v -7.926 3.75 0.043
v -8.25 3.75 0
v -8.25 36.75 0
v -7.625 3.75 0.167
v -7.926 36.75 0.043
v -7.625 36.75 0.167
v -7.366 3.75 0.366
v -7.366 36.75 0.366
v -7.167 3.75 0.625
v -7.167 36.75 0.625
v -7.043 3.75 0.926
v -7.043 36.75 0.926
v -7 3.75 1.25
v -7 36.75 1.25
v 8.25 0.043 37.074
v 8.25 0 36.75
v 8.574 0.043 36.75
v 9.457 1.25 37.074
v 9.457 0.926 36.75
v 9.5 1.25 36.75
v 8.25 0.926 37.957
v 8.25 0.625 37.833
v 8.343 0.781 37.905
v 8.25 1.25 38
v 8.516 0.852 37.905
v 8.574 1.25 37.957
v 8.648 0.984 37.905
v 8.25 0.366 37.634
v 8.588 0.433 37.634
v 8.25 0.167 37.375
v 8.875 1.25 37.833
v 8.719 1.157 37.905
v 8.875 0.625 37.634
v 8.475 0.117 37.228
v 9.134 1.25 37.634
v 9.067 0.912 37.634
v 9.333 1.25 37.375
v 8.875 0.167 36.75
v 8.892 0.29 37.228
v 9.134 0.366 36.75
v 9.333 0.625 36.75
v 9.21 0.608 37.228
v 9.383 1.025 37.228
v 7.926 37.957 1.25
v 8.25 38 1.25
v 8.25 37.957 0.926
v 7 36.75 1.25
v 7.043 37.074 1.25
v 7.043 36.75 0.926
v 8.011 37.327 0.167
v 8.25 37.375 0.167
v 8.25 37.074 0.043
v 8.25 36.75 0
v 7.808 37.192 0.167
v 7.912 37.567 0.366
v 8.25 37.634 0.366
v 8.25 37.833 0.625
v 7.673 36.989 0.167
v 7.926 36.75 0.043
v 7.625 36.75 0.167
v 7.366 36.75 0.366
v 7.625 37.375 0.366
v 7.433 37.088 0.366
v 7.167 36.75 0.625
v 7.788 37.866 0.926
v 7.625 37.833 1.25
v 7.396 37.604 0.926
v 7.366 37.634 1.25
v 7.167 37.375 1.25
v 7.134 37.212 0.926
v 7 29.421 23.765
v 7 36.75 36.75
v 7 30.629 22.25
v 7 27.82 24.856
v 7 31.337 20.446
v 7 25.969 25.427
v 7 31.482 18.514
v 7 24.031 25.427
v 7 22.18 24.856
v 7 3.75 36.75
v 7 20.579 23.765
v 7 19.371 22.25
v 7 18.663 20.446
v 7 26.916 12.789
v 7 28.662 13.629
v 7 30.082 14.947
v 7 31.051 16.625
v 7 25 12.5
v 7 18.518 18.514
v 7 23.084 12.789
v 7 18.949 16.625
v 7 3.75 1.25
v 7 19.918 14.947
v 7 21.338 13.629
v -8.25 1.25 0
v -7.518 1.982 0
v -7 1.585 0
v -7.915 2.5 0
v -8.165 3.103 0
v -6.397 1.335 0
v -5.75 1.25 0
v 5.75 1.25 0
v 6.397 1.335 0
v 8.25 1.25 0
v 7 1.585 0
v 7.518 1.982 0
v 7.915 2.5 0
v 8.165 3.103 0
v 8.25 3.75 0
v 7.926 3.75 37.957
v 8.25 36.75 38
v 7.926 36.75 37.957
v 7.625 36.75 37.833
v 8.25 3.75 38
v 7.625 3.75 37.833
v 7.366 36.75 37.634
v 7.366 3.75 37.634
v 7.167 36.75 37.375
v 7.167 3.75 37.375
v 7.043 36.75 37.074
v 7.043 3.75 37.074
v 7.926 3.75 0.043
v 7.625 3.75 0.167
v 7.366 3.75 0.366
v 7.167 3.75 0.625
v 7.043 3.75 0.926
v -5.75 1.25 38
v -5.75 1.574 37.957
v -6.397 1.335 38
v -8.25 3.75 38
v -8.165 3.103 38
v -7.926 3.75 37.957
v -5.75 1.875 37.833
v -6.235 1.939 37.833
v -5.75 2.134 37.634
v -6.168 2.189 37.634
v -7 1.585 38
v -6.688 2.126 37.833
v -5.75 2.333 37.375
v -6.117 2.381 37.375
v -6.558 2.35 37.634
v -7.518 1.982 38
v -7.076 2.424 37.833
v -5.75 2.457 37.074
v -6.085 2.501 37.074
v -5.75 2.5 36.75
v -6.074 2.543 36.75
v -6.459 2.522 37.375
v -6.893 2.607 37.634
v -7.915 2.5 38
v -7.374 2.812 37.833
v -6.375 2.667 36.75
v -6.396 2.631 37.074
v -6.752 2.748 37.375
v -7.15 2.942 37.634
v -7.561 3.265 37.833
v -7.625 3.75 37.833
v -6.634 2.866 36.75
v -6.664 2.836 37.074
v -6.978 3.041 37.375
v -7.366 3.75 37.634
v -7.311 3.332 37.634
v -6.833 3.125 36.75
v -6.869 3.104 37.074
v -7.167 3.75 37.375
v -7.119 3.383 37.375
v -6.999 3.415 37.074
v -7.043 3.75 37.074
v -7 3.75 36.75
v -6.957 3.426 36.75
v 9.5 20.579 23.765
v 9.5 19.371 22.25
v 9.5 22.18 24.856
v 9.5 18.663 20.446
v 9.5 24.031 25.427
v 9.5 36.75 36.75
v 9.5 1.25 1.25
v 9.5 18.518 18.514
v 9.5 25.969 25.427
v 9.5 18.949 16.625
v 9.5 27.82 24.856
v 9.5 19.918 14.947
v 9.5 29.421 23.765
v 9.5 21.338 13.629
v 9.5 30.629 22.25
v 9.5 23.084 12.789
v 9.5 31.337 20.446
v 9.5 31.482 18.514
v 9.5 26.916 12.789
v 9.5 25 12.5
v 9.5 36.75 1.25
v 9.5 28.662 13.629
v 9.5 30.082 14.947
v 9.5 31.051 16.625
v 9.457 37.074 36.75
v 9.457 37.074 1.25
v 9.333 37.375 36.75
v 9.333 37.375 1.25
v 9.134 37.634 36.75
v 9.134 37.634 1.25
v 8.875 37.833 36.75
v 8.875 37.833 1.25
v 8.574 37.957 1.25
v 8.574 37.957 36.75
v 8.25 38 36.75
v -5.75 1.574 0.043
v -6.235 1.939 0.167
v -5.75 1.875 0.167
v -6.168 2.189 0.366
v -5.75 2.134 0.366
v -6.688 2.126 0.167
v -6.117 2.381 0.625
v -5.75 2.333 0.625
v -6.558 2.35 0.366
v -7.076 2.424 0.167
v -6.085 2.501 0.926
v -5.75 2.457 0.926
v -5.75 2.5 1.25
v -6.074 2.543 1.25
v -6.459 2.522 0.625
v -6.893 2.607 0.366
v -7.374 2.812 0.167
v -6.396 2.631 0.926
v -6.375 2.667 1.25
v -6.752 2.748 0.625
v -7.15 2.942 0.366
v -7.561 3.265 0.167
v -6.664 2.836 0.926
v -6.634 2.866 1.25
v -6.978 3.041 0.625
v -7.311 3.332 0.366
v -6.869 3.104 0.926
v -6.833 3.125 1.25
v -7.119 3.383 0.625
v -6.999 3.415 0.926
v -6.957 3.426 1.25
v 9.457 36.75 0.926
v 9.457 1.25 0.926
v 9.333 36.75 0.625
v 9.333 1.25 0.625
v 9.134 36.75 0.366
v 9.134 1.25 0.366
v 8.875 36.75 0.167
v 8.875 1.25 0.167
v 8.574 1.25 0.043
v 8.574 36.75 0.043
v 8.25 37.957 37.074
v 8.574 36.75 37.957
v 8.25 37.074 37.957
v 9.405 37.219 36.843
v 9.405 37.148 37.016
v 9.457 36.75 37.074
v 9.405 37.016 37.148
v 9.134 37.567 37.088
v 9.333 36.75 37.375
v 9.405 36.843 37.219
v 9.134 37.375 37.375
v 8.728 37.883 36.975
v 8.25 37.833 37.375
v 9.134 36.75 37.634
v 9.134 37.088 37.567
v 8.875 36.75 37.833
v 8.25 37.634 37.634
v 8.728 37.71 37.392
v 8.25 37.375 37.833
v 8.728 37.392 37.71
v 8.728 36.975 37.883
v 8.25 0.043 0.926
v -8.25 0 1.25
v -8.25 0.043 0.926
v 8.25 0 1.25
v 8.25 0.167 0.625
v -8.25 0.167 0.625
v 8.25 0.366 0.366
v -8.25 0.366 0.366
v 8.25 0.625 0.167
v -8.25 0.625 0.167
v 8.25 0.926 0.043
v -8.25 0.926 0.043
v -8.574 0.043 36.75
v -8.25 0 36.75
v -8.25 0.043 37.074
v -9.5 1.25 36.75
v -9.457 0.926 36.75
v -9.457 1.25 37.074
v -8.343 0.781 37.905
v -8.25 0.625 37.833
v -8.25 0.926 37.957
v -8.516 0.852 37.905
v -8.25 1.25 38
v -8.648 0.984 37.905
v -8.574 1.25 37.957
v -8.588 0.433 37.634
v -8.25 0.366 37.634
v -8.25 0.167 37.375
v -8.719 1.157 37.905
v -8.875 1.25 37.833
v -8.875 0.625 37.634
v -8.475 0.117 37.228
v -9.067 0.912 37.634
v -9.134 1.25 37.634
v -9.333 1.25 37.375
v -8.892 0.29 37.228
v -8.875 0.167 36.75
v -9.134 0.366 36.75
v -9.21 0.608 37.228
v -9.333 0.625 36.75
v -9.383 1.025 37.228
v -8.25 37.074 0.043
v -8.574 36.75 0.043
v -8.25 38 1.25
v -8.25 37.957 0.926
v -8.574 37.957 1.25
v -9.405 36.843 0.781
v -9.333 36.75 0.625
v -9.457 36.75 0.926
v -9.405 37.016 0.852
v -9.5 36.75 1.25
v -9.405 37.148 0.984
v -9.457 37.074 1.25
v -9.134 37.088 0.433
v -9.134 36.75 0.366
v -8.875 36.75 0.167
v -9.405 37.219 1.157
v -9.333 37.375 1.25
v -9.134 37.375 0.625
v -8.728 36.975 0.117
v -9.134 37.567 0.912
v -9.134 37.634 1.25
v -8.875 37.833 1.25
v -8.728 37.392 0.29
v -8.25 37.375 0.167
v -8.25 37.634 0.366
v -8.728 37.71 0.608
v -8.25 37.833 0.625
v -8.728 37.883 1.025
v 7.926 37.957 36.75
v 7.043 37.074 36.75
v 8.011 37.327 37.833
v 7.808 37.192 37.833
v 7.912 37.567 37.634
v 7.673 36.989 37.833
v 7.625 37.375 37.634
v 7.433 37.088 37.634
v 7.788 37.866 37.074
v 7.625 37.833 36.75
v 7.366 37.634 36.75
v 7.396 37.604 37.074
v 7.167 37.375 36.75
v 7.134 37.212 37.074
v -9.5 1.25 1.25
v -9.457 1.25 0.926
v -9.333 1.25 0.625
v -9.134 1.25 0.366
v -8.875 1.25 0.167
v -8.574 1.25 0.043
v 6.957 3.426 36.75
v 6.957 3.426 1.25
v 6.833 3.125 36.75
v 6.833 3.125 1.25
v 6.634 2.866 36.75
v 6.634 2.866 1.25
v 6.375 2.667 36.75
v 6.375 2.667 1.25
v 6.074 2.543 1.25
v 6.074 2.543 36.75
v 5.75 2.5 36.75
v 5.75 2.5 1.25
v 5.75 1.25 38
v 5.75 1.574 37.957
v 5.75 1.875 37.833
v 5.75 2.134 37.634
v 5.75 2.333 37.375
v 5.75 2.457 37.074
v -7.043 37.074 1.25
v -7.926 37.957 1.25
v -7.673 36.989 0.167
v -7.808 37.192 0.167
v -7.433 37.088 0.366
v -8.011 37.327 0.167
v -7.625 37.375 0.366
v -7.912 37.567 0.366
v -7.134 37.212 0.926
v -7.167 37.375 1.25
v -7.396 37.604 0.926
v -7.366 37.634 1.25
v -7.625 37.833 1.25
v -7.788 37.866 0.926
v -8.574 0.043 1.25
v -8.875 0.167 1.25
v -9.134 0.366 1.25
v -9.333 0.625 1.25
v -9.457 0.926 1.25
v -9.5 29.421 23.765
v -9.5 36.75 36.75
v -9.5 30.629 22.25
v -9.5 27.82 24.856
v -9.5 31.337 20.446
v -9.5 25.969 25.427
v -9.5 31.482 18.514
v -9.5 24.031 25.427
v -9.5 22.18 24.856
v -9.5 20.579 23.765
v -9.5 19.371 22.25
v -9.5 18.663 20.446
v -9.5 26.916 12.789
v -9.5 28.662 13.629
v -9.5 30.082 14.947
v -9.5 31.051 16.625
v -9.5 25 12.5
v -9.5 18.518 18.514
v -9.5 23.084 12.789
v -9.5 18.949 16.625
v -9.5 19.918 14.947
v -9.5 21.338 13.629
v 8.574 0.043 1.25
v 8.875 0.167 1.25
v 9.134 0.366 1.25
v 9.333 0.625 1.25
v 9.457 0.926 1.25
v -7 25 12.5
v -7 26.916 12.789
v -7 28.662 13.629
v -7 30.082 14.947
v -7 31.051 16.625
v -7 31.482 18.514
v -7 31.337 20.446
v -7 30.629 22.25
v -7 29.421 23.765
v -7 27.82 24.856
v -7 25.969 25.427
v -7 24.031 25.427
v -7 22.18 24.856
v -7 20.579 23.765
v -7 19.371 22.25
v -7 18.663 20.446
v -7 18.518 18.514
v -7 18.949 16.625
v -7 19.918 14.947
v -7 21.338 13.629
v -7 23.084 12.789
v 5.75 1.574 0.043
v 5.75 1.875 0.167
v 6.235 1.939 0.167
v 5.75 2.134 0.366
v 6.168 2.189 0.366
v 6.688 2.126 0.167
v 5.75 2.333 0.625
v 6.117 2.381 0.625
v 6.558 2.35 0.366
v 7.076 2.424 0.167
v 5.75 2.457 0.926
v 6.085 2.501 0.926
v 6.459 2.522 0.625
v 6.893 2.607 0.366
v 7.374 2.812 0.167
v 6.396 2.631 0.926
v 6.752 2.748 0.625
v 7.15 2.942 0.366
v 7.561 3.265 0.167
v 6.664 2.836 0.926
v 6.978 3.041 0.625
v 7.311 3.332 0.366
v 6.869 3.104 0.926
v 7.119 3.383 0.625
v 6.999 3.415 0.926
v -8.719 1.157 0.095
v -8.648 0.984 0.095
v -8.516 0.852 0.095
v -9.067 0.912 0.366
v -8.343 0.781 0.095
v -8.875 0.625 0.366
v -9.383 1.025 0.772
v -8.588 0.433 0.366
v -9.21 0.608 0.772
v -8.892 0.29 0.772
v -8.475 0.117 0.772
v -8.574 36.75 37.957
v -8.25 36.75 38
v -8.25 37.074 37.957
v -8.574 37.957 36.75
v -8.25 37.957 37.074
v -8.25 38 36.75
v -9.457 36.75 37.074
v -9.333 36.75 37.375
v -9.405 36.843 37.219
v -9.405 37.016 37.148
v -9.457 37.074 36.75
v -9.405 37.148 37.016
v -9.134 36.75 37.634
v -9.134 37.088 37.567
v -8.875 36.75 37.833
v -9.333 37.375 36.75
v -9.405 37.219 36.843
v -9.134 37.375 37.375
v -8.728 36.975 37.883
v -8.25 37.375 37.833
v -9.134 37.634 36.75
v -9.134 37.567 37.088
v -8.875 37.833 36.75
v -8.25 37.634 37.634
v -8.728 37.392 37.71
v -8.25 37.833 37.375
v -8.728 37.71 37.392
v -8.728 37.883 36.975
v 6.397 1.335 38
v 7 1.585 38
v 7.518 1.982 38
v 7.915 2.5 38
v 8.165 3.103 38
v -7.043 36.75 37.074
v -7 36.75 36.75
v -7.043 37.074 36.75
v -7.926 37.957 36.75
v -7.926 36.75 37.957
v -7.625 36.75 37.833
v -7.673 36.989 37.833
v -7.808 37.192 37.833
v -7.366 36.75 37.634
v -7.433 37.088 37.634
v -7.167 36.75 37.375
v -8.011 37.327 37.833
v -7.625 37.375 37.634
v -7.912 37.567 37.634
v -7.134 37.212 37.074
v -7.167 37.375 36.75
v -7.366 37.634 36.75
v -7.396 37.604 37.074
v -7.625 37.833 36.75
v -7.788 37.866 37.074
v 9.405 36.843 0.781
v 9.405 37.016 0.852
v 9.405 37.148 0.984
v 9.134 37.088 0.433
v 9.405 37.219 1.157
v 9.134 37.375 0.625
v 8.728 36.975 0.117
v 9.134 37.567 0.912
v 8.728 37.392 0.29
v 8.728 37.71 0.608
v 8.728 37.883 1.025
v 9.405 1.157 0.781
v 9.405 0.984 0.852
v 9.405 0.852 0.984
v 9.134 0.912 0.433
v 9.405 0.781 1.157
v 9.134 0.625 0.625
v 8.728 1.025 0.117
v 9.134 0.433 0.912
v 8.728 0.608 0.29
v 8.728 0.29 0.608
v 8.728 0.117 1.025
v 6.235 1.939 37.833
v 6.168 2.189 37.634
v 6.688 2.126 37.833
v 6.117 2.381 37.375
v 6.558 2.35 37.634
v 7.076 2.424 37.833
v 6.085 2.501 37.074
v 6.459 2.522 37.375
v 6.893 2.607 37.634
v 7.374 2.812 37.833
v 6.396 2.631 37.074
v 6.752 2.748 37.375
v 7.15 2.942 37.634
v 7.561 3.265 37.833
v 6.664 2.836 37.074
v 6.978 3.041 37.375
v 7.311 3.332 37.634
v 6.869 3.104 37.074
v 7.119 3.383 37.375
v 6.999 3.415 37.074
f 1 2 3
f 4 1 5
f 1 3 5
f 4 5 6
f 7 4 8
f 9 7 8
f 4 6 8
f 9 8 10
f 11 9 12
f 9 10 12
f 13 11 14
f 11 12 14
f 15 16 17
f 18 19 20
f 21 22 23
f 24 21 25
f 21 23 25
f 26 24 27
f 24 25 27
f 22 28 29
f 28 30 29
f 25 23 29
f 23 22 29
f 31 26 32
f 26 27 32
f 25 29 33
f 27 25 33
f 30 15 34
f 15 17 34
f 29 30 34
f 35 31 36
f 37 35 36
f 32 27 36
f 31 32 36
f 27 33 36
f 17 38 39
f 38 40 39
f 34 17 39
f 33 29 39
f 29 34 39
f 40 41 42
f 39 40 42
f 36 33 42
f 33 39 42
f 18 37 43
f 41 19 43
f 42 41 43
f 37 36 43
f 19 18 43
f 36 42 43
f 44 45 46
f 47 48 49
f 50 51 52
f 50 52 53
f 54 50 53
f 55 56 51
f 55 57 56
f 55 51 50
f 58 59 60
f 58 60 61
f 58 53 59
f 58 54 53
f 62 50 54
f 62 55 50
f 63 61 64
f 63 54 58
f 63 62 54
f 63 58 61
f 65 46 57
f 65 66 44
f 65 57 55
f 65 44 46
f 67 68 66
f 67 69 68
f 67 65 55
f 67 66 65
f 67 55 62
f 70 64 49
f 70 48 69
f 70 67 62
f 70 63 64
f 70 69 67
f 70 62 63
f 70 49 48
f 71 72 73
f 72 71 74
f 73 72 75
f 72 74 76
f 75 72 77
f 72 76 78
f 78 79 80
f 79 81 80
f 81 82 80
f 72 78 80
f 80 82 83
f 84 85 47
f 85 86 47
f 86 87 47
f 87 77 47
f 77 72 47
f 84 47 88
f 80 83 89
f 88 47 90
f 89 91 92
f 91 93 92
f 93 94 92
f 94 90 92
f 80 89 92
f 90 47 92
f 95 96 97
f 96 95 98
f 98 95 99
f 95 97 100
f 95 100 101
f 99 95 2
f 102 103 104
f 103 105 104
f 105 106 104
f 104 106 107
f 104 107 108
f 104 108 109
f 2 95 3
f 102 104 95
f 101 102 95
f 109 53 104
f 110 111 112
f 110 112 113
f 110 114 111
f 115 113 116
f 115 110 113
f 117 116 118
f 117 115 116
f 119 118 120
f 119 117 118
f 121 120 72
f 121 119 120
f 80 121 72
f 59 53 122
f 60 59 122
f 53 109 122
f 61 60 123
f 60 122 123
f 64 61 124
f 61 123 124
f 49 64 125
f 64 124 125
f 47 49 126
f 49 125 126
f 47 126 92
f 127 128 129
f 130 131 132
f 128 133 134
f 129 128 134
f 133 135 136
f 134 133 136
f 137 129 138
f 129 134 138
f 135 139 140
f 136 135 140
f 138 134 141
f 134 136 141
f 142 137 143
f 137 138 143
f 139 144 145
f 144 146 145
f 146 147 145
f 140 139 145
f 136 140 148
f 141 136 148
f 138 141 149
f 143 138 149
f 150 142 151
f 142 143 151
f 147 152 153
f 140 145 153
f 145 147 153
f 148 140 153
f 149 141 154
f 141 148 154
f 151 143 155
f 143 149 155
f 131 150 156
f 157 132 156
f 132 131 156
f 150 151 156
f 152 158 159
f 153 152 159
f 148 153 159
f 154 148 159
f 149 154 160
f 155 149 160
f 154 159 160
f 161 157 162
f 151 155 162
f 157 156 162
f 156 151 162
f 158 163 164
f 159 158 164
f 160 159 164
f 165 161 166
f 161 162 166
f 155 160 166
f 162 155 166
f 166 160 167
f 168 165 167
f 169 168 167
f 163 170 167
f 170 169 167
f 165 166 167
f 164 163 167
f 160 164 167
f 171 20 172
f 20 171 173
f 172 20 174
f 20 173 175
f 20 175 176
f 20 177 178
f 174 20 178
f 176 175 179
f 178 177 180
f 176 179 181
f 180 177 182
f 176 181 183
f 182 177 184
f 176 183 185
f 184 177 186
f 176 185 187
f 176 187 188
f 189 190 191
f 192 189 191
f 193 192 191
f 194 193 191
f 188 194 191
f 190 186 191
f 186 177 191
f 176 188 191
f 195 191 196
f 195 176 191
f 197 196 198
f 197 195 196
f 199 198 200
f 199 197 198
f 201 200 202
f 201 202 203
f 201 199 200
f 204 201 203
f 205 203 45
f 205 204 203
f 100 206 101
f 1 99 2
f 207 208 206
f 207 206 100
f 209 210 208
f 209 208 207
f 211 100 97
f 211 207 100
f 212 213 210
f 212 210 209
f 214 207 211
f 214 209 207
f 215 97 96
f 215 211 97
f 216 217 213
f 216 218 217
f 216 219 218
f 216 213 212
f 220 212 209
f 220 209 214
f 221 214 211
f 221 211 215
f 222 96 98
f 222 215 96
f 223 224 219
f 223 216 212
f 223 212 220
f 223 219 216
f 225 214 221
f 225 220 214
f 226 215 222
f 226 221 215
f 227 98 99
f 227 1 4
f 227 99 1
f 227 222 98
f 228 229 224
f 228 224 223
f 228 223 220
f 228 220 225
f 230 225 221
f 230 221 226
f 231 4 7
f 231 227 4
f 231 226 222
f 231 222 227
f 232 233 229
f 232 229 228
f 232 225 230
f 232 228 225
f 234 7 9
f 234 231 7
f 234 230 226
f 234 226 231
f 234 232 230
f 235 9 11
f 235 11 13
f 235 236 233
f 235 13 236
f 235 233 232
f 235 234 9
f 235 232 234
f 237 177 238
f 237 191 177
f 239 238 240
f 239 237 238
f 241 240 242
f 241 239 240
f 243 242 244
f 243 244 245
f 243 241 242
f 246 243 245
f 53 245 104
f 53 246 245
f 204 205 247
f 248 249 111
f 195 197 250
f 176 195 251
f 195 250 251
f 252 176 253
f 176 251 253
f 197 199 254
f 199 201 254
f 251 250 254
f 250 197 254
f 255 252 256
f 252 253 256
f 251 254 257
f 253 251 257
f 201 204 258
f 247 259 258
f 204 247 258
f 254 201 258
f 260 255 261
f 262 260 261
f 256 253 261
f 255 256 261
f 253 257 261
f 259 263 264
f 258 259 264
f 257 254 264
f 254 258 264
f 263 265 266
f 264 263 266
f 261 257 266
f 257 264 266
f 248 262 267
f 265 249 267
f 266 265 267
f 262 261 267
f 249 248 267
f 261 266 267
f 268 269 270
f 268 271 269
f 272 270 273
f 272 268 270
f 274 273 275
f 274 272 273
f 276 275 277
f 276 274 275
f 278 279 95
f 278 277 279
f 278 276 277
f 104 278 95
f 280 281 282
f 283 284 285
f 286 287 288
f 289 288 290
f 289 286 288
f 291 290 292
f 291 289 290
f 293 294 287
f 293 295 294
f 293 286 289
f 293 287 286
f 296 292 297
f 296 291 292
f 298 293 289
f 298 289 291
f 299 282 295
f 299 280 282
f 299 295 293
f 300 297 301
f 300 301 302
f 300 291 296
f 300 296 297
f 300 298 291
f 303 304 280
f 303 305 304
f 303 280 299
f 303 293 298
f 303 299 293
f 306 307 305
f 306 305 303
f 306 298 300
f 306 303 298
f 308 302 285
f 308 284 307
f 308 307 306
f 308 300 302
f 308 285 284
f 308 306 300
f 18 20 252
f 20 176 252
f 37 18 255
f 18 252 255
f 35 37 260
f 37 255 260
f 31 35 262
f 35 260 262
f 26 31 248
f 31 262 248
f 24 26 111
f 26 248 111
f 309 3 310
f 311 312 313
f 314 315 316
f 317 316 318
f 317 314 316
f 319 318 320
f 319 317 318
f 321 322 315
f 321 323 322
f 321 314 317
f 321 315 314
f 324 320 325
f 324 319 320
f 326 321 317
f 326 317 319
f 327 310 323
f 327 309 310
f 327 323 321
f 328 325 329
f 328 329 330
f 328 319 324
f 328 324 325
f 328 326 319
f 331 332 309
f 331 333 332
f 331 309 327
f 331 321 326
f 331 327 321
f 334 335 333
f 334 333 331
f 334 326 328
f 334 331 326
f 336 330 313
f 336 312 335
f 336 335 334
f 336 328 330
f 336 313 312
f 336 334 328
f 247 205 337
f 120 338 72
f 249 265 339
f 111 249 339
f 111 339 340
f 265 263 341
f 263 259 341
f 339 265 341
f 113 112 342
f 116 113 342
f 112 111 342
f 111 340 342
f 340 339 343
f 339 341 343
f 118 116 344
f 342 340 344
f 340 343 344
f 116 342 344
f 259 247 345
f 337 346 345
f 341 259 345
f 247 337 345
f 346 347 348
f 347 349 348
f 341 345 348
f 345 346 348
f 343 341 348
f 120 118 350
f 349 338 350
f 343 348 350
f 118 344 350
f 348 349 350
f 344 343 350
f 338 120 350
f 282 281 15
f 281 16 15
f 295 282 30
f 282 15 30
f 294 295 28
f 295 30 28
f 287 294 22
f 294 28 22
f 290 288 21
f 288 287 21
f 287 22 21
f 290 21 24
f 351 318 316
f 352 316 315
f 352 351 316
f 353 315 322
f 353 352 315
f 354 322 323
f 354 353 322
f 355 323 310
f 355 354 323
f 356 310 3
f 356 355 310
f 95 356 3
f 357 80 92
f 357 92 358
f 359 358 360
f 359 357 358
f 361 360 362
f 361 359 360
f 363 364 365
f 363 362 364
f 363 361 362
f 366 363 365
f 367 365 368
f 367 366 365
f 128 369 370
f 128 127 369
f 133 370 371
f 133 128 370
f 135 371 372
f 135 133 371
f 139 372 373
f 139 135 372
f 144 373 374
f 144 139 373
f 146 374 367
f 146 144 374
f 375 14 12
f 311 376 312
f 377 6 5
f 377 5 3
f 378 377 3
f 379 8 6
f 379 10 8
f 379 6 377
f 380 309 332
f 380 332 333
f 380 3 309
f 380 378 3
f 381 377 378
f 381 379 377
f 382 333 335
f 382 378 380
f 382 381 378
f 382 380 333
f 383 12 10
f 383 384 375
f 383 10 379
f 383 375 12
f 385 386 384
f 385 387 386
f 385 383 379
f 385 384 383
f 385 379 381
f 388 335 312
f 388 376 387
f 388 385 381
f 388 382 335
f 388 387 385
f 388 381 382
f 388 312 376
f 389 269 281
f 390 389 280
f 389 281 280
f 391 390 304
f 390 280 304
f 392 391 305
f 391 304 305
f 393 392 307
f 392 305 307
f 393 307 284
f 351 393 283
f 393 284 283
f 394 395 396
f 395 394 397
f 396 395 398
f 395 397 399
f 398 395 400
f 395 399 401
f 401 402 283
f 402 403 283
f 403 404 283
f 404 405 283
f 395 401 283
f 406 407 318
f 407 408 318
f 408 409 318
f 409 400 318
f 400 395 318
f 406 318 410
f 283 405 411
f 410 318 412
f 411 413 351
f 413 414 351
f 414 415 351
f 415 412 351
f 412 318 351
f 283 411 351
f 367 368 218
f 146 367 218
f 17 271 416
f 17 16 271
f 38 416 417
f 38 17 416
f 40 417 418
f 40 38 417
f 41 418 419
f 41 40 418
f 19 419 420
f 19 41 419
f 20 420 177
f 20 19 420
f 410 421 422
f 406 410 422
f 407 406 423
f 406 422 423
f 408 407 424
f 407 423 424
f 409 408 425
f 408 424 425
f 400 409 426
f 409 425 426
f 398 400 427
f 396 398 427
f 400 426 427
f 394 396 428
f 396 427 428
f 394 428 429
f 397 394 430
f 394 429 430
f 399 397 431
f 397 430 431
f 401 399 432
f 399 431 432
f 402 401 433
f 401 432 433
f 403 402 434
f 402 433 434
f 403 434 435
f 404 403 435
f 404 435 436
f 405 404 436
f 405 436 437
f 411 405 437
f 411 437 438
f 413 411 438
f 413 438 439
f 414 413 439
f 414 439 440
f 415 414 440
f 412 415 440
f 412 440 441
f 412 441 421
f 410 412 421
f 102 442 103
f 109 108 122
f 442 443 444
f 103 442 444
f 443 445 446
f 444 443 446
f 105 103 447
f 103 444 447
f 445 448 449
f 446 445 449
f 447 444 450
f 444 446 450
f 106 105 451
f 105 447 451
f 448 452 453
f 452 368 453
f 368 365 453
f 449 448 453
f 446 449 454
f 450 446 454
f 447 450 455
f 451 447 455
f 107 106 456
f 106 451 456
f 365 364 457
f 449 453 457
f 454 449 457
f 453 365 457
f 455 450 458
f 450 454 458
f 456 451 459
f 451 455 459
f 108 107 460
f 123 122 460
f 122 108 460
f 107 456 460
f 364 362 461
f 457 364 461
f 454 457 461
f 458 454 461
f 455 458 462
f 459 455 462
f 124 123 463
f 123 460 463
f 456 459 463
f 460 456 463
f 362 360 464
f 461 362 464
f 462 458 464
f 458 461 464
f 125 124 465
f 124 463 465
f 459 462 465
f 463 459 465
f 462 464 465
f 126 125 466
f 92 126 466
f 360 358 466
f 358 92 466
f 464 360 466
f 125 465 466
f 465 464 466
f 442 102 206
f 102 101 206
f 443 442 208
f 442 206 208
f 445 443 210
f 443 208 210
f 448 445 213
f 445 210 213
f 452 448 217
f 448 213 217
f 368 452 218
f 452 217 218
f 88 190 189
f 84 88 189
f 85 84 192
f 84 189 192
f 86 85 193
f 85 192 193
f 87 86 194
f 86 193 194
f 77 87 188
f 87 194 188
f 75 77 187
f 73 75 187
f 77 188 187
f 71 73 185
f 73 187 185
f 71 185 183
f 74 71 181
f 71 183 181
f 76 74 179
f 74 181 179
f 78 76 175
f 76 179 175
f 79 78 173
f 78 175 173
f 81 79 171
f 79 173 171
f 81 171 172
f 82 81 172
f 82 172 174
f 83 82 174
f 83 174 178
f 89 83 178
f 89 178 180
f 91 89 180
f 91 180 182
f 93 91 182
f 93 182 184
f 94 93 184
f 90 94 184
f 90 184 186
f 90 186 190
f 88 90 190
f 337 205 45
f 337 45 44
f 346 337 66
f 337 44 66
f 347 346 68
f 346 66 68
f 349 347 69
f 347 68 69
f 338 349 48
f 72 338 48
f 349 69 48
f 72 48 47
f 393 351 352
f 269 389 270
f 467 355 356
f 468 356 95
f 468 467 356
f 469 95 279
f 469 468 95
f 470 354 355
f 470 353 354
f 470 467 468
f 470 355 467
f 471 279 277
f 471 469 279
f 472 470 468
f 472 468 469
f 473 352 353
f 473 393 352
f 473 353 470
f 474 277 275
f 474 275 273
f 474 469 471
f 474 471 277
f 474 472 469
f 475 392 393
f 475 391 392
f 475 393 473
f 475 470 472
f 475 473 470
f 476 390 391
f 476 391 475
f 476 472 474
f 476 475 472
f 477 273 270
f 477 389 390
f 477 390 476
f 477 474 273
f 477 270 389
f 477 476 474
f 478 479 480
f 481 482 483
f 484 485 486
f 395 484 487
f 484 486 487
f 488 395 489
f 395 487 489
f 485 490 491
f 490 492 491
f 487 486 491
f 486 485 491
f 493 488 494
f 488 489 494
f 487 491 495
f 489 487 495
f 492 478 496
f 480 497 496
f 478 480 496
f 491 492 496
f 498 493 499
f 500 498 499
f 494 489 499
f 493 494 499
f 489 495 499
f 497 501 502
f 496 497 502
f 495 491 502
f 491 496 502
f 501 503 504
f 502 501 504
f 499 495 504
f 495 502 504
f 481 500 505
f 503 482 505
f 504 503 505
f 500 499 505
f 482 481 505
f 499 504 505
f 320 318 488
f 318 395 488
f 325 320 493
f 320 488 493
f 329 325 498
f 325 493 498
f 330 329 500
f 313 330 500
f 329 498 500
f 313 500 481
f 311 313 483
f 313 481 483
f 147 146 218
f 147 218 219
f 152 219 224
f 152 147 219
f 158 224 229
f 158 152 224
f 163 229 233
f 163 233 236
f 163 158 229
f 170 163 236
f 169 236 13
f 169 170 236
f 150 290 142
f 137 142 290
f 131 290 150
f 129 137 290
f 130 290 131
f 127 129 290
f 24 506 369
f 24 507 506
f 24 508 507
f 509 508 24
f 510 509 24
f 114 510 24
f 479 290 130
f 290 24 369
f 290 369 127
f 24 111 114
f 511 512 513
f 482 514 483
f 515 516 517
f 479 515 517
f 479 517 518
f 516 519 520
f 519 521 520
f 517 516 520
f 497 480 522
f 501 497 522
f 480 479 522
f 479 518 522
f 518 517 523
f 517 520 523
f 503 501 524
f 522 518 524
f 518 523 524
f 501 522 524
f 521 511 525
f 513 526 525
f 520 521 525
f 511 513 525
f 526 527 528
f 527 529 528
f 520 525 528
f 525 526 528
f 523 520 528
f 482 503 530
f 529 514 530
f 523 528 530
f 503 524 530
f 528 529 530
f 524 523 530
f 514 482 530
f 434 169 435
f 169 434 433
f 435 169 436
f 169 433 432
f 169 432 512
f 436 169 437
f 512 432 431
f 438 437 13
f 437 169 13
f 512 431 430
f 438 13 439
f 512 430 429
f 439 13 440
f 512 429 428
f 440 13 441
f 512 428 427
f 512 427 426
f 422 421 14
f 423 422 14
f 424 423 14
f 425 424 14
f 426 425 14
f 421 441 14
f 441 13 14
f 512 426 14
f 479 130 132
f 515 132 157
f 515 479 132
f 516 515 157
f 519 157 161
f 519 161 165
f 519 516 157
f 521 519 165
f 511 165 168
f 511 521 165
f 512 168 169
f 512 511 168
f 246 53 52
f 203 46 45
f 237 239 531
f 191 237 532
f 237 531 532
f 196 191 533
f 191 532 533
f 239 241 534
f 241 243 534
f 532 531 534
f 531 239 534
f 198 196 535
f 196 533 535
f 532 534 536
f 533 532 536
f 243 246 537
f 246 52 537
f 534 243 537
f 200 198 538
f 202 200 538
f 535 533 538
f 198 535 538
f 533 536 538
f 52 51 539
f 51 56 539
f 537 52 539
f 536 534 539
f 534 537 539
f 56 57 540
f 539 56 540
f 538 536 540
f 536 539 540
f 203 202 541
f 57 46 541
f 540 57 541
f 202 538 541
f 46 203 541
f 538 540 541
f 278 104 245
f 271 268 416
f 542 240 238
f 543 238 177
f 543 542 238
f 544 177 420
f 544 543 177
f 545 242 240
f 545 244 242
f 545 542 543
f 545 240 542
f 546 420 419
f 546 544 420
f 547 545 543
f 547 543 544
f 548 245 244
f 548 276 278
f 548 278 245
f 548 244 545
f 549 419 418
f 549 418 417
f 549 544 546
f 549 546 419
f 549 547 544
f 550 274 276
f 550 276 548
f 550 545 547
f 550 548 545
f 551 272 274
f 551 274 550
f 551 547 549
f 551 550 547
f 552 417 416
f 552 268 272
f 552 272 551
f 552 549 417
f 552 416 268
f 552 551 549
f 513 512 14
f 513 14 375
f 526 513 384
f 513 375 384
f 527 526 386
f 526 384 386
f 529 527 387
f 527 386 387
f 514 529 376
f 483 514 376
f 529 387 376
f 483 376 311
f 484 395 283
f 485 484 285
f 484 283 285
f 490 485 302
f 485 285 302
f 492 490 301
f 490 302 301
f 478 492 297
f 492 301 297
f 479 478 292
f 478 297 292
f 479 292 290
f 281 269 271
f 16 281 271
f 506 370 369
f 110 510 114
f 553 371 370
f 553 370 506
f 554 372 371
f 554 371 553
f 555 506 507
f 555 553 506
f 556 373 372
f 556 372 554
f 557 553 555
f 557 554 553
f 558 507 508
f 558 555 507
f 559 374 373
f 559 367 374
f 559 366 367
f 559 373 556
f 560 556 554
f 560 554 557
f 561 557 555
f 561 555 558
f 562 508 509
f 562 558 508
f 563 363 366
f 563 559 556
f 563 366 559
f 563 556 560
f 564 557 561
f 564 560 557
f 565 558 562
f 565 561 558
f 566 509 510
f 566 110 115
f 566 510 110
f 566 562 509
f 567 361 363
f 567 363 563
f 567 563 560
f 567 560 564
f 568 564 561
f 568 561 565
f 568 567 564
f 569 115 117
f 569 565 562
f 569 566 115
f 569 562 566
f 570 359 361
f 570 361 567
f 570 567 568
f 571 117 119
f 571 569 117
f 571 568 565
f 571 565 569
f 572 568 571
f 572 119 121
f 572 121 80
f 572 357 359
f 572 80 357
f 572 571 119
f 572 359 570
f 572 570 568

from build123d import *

# Parameters (mm, degrees)
BOSS_EXTRUDE1_DEPTH = 38
SKETCH2_R           = 6.5
CUT_EXTRUDE1_DEPTH  = 58
FILLET1_R           = 1.25


with BuildPart() as part:
    # Sketch1 → Boss-Extrude1 (new body)
    with BuildSketch(Plane.XY):
        with BuildLine():
            Line((-9.5, 0), (9.5, 0))
            Line((9.5, 0), (9.5, 38))
            Line((9.5, 38), (8.25, 38))
            ThreePointArc((8.25, 38), (7.366116524, 37.633883476), (7, 36.75))
            Line((7, 36.75), (7, 2.5))
            Line((7, 2.5), (-7, 2.5))
            Line((-7, 2.5), (-7, 36.75))
            ThreePointArc((-7, 36.75), (-7.366116524, 37.633883476), (-8.25, 38))
            Line((-8.25, 38), (-9.5, 38))
            Line((-9.5, 38), (-9.5, 0))
        make_face()
    extrude(amount=BOSS_EXTRUDE1_DEPTH)

    # Sketch2 → Cut-Extrude1 (cut, through all)
    with BuildSketch(Plane(origin=(9.5, 0, 0), x_dir=(0, 0, -1), z_dir=(1, 0, 0))):
        with Locations((-19, 25)):
            Circle(SKETCH2_R)
    extrude(amount=-CUT_EXTRUDE1_DEPTH, mode=Mode.SUBTRACT)

    # Fillet1
    fillet1_edges = [part.edges().sort_by_distance(p)[0] for p in [
        (-7.366116524, 37.633883476, 0),
        (7.366116524, 37.633883476, 0),
        (7.366116524, 37.633883476, 38),
        (-7.366116524, 37.633883476, 38),
        (-9.5, 0, 19),
        (7, 2.5, 19),
        (-7, 2.5, 19),
        (-7, 19.625, 0),
        (-9.5, 19, 0),
        (0, 0, 0),
        (0, 2.5, 0),
        (7, 19.625, 0),
        (9.5, 19, 0),
        (9.5, 0, 19),
        (0, 0, 38),
        (-9.5, 19, 38),
        (-9.5, 38, 19),
        (9.5, 38, 19),
        (9.5, 19, 38),
        (7, 19.625, 38),
        (-7, 19.625, 38),
        (0, 2.5, 38),
    ]]
    fillet(fillet1_edges, radius=FILLET1_R - 0.0001)  # a hair under: the kernel refuses the full size


solid = part.part
